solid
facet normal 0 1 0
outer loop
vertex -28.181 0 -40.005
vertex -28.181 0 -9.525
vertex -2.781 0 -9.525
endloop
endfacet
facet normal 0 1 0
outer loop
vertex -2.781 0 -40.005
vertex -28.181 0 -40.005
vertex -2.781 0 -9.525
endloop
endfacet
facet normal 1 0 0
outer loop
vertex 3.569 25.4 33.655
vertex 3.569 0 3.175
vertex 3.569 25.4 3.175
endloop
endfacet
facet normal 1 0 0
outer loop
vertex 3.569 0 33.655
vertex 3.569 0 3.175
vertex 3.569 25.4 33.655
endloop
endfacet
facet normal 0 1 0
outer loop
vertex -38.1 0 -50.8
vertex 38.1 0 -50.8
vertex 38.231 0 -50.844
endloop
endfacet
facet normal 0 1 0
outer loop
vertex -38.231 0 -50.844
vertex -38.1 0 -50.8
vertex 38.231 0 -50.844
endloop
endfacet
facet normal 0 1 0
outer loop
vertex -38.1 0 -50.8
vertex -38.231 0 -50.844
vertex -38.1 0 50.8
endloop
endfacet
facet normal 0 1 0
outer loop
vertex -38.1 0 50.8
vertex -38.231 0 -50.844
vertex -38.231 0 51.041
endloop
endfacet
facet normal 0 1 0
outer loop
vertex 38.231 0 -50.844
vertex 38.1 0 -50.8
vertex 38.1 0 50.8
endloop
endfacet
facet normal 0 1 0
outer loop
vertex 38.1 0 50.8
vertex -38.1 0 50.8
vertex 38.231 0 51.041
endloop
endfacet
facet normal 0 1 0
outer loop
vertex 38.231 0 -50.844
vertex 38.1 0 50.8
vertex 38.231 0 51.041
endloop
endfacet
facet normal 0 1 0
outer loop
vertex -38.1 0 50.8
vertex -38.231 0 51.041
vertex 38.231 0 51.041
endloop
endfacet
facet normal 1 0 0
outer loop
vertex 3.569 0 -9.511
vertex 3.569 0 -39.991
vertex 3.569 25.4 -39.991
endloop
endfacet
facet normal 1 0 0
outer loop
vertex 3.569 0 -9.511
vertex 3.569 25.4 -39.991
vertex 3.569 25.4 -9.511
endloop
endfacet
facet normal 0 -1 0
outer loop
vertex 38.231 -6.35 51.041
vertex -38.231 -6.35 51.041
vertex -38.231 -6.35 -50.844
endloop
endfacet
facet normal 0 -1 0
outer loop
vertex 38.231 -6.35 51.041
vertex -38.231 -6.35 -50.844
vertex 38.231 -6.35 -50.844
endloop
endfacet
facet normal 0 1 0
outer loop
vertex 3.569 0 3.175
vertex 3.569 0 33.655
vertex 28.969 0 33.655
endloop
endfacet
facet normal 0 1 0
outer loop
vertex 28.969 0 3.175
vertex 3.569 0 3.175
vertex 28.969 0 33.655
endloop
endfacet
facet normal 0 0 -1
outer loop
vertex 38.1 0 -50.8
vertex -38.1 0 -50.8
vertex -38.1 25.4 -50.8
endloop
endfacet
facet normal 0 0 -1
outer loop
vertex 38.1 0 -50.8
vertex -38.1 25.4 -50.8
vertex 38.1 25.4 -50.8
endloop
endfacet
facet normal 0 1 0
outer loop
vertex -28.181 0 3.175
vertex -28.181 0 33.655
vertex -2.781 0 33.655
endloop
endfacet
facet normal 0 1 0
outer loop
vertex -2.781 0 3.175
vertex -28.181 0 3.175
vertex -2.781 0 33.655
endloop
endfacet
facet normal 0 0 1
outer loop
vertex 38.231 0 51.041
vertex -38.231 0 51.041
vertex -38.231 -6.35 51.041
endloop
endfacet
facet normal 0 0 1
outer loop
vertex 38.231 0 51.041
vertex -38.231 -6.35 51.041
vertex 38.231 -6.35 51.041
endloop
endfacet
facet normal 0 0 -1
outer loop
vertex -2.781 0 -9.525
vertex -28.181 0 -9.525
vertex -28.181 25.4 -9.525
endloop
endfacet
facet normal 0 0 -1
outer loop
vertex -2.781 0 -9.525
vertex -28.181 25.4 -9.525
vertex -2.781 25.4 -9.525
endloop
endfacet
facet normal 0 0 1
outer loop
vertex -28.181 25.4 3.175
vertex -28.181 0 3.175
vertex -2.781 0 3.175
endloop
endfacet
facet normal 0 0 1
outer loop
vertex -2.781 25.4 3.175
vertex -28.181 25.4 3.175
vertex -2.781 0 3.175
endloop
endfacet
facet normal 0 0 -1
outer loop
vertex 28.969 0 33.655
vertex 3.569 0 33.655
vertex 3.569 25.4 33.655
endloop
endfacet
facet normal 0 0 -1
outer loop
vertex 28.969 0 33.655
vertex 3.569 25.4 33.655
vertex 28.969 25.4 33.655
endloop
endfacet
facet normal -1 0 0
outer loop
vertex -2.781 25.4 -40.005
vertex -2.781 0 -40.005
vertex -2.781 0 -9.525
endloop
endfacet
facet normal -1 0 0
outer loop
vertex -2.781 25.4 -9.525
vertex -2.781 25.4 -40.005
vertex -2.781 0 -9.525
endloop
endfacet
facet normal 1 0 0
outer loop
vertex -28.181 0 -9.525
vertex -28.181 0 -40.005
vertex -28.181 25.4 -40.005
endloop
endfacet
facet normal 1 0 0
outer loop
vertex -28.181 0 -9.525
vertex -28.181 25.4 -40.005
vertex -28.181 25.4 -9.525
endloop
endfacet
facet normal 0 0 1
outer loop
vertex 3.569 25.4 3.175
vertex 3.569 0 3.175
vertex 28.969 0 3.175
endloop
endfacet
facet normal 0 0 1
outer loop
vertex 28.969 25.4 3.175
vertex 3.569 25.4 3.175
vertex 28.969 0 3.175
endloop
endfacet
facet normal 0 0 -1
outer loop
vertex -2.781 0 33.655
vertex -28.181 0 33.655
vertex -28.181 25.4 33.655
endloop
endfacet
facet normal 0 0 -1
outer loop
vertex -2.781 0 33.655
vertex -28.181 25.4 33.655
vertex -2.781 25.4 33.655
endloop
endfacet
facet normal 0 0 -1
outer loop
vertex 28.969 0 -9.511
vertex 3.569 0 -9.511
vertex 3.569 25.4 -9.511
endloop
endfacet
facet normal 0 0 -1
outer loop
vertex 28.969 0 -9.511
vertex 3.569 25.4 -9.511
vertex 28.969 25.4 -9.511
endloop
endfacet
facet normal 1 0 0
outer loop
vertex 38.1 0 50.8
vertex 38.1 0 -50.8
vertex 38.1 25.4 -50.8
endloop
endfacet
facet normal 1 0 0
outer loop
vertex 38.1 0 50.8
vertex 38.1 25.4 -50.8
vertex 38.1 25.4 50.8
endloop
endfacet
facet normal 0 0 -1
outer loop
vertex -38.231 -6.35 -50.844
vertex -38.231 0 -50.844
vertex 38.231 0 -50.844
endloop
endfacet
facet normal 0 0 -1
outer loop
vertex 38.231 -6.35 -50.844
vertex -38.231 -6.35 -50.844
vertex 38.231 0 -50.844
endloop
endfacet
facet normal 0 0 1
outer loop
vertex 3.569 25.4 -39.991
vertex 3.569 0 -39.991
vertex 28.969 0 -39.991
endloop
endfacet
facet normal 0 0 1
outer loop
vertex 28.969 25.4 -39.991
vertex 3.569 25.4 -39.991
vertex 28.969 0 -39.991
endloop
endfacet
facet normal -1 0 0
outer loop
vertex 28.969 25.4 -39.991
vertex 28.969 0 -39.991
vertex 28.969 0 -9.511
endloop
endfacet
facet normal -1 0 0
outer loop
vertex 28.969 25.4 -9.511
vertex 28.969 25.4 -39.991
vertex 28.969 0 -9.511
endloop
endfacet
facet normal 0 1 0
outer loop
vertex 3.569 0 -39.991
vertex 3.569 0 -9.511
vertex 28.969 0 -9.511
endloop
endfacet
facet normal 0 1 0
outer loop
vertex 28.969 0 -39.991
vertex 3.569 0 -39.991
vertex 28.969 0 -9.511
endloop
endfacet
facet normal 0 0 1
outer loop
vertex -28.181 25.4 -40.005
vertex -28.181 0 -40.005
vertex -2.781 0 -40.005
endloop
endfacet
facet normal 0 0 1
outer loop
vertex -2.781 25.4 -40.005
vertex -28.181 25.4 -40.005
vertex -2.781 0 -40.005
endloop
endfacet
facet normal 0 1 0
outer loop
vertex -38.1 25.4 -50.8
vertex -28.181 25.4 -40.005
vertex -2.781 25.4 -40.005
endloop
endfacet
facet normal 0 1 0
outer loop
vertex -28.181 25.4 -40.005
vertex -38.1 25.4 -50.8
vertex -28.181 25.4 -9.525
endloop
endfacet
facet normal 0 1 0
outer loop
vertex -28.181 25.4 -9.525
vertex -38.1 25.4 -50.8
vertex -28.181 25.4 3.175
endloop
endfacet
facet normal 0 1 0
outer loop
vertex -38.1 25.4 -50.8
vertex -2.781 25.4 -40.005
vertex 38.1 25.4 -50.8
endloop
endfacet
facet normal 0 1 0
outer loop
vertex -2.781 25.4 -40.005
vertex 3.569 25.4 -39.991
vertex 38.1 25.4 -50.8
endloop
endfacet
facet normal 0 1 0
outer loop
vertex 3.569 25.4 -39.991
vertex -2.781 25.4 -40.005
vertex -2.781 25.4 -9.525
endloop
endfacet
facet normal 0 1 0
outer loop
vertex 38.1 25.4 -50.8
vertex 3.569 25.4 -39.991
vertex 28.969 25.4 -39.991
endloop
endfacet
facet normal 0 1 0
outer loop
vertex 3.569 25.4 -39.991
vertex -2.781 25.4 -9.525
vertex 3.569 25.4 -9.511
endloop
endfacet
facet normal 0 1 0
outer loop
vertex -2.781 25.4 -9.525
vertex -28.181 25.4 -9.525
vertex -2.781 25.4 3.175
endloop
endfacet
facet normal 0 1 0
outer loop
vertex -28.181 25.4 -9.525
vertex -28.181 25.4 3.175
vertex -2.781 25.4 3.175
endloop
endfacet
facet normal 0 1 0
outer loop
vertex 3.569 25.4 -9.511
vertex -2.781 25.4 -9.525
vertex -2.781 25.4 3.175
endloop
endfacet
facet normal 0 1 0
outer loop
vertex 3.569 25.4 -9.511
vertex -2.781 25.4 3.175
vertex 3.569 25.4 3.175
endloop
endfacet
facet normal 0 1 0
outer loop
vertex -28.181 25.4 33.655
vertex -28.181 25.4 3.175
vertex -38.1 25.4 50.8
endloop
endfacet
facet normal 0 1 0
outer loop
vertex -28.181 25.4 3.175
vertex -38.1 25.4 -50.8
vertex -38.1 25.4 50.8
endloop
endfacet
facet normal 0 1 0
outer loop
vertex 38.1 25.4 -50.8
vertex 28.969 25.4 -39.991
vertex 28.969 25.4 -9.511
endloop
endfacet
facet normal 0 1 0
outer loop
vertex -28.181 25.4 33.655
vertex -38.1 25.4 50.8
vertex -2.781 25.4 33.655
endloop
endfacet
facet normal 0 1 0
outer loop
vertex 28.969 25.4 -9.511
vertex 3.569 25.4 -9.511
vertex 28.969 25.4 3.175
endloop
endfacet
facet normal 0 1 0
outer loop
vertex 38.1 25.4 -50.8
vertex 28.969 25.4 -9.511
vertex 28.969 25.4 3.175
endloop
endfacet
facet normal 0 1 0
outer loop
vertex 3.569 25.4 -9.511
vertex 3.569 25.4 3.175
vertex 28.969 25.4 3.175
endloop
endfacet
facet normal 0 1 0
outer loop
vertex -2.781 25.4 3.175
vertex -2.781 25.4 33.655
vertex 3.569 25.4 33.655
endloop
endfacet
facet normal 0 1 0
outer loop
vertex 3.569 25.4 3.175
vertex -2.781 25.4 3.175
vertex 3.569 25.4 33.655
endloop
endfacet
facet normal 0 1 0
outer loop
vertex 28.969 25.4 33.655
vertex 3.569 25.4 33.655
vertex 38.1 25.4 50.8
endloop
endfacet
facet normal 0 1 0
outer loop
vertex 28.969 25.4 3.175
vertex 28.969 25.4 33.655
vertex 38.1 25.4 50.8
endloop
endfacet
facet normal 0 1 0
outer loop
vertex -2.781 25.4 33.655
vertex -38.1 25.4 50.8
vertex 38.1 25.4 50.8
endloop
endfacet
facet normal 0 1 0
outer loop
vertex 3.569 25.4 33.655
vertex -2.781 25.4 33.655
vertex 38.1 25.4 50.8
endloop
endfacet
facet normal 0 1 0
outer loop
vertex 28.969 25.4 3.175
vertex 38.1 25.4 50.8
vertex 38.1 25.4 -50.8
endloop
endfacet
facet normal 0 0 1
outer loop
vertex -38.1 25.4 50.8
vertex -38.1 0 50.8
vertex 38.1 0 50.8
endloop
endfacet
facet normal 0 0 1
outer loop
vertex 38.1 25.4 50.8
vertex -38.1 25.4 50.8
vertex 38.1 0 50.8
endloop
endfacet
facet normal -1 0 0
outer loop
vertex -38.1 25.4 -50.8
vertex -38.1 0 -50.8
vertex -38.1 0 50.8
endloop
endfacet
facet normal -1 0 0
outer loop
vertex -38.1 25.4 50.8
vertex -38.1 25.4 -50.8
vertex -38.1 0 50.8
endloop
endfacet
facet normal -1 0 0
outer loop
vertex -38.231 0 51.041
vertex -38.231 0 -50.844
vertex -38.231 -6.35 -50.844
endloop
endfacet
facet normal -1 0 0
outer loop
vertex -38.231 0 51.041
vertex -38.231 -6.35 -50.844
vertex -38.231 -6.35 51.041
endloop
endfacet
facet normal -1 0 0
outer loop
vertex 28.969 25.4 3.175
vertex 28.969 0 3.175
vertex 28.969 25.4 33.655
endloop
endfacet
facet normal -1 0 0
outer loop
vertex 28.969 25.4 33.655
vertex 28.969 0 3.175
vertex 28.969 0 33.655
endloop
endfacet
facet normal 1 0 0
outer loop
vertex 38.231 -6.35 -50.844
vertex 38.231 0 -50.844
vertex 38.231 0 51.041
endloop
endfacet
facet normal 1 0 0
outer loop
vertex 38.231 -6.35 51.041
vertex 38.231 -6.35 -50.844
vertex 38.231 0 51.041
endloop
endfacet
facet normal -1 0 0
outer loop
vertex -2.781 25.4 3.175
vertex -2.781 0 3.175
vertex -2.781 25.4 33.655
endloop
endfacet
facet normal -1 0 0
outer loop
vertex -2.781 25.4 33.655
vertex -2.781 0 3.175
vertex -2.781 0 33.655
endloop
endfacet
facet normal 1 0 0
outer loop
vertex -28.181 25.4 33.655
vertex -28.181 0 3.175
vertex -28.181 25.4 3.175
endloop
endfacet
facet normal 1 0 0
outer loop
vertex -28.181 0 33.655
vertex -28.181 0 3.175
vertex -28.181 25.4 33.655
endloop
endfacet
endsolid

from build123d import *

# Parameters (mm, degrees)
F0_W     = 76.2
F0_H     = 101.6
F0_W_2   = 25.4
F0_H_2   = 30.48
F1_DEPTH = 25.4
F2_W     = 76.462764
F2_H     = 101.884663
F3_DEPTH = 6.35


with BuildPart() as f1:
    # F0 (on Front) → F1 (new body)
    with BuildSketch(Plane.XZ):
        Rectangle(F0_W, F0_H)
        with Locations((-15.480864, -24.765002)):
            Rectangle(F0_W_2, F0_H_2, mode=Mode.SUBTRACT)
        with Locations((16.269136, -24.751032)):
            Rectangle(F0_W_2, F0_H_2, mode=Mode.SUBTRACT)
        with Locations((-15.480864, 18.414998)):
            Rectangle(F0_W_2, F0_H_2, mode=Mode.SUBTRACT)
        with Locations((16.269136, 18.414998)):
            Rectangle(F0_W_2, F0_H_2, mode=Mode.SUBTRACT)
    extrude(amount=-F1_DEPTH)

    # F2 (on Front) → F3 (join)
    with BuildSketch(Plane.XZ):
        with Locations((-2e-06, 0.098533)):
            Rectangle(F2_W, F2_H)
    extrude(amount=F3_DEPTH)


solid = f1.part
